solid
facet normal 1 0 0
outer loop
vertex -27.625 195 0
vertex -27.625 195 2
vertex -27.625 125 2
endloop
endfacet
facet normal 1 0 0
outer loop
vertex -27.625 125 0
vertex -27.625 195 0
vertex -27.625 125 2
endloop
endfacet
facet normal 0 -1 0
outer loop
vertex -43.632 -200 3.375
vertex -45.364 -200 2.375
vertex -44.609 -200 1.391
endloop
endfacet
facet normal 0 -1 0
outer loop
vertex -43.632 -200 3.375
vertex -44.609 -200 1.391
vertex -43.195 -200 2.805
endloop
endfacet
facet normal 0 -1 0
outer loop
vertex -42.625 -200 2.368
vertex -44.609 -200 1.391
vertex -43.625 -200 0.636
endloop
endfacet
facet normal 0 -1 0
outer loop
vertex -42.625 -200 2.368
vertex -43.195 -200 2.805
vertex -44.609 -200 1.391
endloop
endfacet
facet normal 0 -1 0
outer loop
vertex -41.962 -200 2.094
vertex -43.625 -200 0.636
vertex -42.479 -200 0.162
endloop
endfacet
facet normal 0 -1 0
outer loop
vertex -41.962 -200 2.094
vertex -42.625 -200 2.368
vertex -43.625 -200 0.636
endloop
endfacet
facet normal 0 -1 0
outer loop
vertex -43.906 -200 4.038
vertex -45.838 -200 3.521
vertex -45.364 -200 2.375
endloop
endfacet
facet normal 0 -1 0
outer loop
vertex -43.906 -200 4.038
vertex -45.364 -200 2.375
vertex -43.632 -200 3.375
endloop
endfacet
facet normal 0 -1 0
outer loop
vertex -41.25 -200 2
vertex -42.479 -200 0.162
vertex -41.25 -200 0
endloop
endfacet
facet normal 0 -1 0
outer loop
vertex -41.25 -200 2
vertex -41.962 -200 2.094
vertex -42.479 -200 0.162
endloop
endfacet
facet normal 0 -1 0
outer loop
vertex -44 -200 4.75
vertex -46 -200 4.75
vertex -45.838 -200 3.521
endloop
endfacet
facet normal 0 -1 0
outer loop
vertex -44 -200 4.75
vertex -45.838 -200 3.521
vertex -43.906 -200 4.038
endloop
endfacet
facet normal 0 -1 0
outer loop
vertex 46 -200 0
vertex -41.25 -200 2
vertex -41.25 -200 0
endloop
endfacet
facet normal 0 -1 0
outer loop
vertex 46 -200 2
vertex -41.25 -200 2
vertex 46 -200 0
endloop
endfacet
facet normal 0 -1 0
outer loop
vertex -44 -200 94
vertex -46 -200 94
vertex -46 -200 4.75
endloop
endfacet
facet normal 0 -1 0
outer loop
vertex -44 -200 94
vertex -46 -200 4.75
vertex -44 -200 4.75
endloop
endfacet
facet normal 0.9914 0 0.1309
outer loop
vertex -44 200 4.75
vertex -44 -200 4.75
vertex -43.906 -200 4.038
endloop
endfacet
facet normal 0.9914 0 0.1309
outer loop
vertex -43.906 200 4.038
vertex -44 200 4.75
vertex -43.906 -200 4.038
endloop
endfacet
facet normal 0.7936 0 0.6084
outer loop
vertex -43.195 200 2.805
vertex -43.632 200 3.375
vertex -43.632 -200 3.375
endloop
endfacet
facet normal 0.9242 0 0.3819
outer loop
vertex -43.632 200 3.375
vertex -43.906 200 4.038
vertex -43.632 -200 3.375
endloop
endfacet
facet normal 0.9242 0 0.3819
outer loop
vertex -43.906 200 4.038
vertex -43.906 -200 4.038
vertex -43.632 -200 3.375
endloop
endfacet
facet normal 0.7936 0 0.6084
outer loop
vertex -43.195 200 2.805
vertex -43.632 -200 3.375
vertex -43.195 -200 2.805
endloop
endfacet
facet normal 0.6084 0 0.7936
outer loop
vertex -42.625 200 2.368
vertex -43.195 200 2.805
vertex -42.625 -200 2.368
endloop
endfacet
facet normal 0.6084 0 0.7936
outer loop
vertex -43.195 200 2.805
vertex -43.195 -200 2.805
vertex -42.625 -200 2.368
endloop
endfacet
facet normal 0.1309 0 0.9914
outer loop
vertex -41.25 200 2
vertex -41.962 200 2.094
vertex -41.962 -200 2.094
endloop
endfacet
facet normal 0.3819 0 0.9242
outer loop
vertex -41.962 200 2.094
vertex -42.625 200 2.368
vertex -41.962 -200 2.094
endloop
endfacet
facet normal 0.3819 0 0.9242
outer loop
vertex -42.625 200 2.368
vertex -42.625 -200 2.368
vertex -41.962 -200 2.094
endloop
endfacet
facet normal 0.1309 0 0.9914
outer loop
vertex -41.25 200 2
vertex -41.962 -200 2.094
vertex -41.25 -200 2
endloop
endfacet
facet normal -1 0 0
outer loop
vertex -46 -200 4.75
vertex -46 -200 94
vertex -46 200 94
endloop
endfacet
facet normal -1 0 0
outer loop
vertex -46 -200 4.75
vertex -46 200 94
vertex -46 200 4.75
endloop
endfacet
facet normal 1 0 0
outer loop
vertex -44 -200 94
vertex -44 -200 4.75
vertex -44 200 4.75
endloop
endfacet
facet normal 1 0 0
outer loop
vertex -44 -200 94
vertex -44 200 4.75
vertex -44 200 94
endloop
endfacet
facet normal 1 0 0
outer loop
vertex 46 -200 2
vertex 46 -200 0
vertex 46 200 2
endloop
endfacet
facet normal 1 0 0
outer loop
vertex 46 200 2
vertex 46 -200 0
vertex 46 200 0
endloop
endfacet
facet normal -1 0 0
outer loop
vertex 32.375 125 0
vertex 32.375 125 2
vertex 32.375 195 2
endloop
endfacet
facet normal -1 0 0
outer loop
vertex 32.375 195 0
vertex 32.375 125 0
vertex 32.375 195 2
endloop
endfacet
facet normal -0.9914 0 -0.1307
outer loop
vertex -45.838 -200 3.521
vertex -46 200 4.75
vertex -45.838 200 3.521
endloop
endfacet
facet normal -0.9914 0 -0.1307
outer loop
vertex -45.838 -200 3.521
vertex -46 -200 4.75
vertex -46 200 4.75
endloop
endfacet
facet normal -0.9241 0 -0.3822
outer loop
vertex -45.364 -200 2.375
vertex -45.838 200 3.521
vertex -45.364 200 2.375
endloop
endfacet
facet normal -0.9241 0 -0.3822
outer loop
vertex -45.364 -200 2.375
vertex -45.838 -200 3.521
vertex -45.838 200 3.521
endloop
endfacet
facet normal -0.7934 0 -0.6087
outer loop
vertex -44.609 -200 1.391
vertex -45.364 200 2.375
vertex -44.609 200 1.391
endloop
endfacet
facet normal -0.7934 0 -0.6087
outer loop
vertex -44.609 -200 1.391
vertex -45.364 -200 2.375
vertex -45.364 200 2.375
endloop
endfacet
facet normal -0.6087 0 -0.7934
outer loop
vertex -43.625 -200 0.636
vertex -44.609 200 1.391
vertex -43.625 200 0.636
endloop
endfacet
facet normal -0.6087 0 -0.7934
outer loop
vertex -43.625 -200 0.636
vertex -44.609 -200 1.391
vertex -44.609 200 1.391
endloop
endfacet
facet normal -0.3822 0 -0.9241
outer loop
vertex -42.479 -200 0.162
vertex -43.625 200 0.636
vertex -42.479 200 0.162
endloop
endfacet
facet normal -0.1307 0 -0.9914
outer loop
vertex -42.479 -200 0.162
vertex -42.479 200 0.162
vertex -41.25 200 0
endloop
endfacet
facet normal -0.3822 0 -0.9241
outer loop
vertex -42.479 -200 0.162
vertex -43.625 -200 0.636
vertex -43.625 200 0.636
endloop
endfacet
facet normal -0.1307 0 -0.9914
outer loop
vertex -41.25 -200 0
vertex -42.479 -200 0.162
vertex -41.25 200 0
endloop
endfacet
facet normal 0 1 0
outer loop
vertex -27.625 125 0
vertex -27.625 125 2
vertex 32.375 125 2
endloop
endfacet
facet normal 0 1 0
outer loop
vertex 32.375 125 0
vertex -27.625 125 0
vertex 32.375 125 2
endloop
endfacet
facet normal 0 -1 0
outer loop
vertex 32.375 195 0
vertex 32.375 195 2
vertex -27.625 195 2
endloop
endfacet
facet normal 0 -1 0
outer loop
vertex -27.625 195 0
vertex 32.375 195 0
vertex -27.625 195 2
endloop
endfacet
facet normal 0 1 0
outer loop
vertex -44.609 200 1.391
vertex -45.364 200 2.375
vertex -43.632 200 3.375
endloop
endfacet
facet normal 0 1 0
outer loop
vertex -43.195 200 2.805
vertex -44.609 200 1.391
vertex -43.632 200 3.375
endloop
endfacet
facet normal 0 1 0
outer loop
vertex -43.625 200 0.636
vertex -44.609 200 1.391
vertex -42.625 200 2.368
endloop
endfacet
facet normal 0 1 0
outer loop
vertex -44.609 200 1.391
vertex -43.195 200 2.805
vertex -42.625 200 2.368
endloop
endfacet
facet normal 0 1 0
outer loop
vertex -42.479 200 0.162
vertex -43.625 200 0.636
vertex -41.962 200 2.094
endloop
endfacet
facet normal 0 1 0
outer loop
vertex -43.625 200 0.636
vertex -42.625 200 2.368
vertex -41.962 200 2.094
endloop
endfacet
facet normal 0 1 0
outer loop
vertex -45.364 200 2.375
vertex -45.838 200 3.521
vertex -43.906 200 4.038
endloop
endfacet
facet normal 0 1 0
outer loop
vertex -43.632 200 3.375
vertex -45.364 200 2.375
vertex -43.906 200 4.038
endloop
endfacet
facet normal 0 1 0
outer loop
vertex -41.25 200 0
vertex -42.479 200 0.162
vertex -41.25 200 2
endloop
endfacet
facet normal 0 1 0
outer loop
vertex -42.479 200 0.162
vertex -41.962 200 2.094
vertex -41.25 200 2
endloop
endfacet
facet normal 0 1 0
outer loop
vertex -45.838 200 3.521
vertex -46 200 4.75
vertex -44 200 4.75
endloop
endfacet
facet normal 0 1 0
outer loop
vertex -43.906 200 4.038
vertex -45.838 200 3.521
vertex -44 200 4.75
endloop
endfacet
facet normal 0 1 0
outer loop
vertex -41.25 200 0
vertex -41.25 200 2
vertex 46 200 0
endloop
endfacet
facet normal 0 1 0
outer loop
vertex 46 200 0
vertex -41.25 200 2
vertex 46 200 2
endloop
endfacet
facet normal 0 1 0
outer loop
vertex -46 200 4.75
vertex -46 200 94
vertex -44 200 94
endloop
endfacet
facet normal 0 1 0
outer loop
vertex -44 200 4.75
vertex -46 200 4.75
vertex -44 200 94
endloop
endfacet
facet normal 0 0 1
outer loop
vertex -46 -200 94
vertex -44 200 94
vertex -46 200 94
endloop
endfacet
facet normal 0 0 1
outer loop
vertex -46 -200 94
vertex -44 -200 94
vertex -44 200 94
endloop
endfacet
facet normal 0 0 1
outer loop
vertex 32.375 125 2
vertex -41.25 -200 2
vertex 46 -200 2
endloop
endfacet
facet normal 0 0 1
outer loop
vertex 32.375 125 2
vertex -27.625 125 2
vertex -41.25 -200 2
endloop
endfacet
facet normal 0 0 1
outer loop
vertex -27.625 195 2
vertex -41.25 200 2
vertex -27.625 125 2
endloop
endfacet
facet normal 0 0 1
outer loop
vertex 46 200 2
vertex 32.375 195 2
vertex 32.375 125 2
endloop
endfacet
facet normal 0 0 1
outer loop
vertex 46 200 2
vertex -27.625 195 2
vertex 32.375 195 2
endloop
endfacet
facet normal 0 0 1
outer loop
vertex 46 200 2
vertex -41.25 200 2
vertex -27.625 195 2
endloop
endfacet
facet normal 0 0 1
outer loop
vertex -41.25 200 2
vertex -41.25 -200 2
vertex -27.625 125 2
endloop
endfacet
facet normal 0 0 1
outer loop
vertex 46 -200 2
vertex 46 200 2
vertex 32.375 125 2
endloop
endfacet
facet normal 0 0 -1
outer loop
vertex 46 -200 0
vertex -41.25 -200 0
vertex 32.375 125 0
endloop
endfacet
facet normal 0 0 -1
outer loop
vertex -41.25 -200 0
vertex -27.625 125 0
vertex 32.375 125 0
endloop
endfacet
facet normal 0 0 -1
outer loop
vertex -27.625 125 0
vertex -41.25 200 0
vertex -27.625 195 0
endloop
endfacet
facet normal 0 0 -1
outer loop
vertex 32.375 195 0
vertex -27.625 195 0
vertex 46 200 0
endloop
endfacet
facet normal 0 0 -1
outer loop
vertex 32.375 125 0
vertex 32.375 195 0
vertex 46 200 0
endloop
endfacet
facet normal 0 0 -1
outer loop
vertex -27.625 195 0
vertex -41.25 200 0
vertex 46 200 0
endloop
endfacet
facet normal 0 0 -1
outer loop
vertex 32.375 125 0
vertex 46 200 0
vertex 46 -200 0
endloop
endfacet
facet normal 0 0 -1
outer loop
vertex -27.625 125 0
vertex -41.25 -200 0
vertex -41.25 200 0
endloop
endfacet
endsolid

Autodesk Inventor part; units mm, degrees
ref_plane "YZ Plane" through (0, 0, 0) normal (1, 0, 0) x (0, 1, 0)
ref_plane "XZ Plane" through (0, 0, 0) normal (0, 1, 0) x (-1, 0, 0)
ref_plane "XY Plane" through (0, 0, 0) normal (0, 0, 1) x (1, 0, 0)
sketch "Sketch1" plane through (0, 0, 0) normal (0, 0, 1) x (1, 0, 0)
  line L0 (-46, -200) -> (46, -200)
  line L1 (46, -200) -> (46, 200)
  line L2 (46, 200) -> (-46, 200)
  line L3 (-46, 200) -> (-46, -200)
  line L4 (-46, -200) -> (46, 200) construction
  line L5 (46, -200) -> (-46, 200) construction
  point P0 (0, 0)
  dimension "d154" = 92
  dimension "d155" = 400
extrude "Plate5" add sketch "Sketch1" along normal blind 2
sketch "Sketch7" plane through (-44, -200, 0) normal (-1, 0, 0) x (0, -1, 0)
  line L0 (-400, 0) -> (0, 0)
  line L1 (0, 0) -> (0, 94)
  line L2 (0, 94) -> (-400, 94)
  line L3 (-400, 94) -> (-400, 0)
edge flange "Flange3" height 94 angle 90 thickness 2 bend radius 2.75 thickness toward (-1, 0, 0) relief round relief width 2 relief depth 1 edges at (-46, 0, 2) wall of the first edge with corners at (-44, 200, 0) (-44, -200, 0) (-44, -200, 94) (-44, 200, 94)
bend "Bend3"
corner "Corner3"
sketch "Sketch8" plane through (0, 0, 2) normal (0, 0, 1) x (1, 0, 0)
  line L0 (46, 200) -> (46, -200) projected
  line L1 (-41.25, 200) -> (46, 200) projected
  line L2 (32.375, 195) -> (-27.625, 195)
  line L3 (-27.625, 195) -> (-27.625, 125)
  line L4 (-27.625, 125) -> (32.375, 125)
  line L5 (32.375, 125) -> (32.375, 195)
  line L6 (32.375, 195) -> (-27.625, 125) construction
  line L7 (-27.625, 195) -> (32.375, 125) construction
  point P0 (0, 0)
  point P1 (2.375, 160)
  point P2 (2.375, 200)
  dimension "d167" = 60
  dimension "d168" = 70
  dimension "d169" = 5
extrude "Cut1" cut sketch "Sketch8" against normal blind 2
properties part number "PNS 752 FDS 1200 FLANGE 2" material "Stainless Steel"
